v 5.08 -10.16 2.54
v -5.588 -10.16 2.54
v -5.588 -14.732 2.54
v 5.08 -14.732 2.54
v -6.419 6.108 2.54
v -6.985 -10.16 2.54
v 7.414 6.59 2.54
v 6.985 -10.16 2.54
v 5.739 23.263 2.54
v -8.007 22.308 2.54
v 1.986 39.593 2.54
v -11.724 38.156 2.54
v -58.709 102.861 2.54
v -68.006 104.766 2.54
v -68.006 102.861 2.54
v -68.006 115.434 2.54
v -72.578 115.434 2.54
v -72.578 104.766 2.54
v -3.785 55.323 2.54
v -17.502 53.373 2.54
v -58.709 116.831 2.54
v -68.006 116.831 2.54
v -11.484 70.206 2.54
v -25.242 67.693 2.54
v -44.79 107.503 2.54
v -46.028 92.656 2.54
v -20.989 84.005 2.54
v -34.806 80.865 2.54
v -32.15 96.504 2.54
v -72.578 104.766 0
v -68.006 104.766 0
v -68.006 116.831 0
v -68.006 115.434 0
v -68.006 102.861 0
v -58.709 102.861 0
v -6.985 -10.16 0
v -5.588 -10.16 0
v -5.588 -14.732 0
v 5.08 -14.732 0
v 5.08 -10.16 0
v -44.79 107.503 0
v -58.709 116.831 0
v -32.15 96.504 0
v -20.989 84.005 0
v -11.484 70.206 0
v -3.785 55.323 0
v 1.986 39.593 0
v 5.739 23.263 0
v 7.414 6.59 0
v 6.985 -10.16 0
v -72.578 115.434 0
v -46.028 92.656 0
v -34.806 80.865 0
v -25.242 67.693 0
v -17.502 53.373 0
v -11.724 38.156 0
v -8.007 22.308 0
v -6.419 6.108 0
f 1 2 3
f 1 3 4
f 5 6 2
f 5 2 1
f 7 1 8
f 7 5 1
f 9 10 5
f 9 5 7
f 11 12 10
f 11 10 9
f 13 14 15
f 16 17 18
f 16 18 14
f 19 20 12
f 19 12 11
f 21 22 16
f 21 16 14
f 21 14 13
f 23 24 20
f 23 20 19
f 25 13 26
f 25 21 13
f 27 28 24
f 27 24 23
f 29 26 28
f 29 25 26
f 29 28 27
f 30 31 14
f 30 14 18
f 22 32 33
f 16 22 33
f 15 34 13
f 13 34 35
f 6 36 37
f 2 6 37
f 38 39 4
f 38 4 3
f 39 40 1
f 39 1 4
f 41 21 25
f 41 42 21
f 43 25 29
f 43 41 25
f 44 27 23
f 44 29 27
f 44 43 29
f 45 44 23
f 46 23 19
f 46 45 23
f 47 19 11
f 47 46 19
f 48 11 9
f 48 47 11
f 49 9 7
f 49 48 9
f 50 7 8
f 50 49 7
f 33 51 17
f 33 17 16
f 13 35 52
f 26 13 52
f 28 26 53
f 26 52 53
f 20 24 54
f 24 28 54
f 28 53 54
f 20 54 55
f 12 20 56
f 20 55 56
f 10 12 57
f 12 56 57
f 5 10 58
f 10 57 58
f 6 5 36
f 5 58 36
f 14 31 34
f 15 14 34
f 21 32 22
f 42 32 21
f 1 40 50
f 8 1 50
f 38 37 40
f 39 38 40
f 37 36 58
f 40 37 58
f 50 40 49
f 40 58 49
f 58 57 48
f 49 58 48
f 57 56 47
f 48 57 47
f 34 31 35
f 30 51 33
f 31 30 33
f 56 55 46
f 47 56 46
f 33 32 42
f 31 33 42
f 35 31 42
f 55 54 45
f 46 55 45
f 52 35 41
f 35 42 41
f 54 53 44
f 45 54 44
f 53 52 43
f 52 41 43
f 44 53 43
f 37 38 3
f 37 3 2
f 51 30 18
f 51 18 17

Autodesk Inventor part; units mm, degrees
ref_plane "YZ Plane" through (0, 0, 0) normal (1, 0, 0) x (0, 1, 0)
ref_plane "XZ Plane" through (0, 0, 0) normal (0, 1, 0) x (-1, 0, 0)
ref_plane "XY Plane" through (0, 0, 0) normal (0, 0, 1) x (1, 0, 0)
sketch "Sketch1" plane through (0, 0, 0) normal (0, 0, 1) x (1, 0, 0)
  line L0 (-6.985, -10.16) -> (6.985, -10.16)
  line L1 (5.08, -10.16) -> (5.08, -14.732)
  line L2 (5.08, -14.732) -> (-5.588, -14.732)
  line L3 (-5.588, -14.732) -> (-5.588, -10.16)
  line L4 (-68.0064, 116.8309) -> (-68.0064, 102.8609)
  line L5 (-68.0064, 104.7659) -> (-72.5784, 104.7659)
  line L6 (-72.5784, 104.7659) -> (-72.5784, 115.4339)
  line L7 (-72.5784, 115.4339) -> (-68.0064, 115.4339)
  line L8 (-68.0064, 116.8309) -> (-58.7093, 116.8309)
  arc A0 (6.985, -10.16) -> (-58.7093, 116.8309) centre (-125.8236, 1.6238) ccw
  line L9 (-68.0064, 102.8609) -> (-58.7093, 102.8609)
  arc A1 (-6.985, -10.16) -> (-58.7093, 102.8609) centre (-129.2297, 2.2407) ccw
  point P0 (0, 0)
  point P1 (0, -10.16)
  point P2 (-68.0064, 109.8459)
  dimension "d0" = 13.97
  dimension "d2" = 10.668
  dimension "d4" = 4.572
  dimension "d5" = 13.97
  dimension "d7" = 10.668
  dimension "d8" = 4.572
extrude "Extrusion1" add sketch "Sketch1" along normal blind 2.54
properties part number "RTS gift arm"
